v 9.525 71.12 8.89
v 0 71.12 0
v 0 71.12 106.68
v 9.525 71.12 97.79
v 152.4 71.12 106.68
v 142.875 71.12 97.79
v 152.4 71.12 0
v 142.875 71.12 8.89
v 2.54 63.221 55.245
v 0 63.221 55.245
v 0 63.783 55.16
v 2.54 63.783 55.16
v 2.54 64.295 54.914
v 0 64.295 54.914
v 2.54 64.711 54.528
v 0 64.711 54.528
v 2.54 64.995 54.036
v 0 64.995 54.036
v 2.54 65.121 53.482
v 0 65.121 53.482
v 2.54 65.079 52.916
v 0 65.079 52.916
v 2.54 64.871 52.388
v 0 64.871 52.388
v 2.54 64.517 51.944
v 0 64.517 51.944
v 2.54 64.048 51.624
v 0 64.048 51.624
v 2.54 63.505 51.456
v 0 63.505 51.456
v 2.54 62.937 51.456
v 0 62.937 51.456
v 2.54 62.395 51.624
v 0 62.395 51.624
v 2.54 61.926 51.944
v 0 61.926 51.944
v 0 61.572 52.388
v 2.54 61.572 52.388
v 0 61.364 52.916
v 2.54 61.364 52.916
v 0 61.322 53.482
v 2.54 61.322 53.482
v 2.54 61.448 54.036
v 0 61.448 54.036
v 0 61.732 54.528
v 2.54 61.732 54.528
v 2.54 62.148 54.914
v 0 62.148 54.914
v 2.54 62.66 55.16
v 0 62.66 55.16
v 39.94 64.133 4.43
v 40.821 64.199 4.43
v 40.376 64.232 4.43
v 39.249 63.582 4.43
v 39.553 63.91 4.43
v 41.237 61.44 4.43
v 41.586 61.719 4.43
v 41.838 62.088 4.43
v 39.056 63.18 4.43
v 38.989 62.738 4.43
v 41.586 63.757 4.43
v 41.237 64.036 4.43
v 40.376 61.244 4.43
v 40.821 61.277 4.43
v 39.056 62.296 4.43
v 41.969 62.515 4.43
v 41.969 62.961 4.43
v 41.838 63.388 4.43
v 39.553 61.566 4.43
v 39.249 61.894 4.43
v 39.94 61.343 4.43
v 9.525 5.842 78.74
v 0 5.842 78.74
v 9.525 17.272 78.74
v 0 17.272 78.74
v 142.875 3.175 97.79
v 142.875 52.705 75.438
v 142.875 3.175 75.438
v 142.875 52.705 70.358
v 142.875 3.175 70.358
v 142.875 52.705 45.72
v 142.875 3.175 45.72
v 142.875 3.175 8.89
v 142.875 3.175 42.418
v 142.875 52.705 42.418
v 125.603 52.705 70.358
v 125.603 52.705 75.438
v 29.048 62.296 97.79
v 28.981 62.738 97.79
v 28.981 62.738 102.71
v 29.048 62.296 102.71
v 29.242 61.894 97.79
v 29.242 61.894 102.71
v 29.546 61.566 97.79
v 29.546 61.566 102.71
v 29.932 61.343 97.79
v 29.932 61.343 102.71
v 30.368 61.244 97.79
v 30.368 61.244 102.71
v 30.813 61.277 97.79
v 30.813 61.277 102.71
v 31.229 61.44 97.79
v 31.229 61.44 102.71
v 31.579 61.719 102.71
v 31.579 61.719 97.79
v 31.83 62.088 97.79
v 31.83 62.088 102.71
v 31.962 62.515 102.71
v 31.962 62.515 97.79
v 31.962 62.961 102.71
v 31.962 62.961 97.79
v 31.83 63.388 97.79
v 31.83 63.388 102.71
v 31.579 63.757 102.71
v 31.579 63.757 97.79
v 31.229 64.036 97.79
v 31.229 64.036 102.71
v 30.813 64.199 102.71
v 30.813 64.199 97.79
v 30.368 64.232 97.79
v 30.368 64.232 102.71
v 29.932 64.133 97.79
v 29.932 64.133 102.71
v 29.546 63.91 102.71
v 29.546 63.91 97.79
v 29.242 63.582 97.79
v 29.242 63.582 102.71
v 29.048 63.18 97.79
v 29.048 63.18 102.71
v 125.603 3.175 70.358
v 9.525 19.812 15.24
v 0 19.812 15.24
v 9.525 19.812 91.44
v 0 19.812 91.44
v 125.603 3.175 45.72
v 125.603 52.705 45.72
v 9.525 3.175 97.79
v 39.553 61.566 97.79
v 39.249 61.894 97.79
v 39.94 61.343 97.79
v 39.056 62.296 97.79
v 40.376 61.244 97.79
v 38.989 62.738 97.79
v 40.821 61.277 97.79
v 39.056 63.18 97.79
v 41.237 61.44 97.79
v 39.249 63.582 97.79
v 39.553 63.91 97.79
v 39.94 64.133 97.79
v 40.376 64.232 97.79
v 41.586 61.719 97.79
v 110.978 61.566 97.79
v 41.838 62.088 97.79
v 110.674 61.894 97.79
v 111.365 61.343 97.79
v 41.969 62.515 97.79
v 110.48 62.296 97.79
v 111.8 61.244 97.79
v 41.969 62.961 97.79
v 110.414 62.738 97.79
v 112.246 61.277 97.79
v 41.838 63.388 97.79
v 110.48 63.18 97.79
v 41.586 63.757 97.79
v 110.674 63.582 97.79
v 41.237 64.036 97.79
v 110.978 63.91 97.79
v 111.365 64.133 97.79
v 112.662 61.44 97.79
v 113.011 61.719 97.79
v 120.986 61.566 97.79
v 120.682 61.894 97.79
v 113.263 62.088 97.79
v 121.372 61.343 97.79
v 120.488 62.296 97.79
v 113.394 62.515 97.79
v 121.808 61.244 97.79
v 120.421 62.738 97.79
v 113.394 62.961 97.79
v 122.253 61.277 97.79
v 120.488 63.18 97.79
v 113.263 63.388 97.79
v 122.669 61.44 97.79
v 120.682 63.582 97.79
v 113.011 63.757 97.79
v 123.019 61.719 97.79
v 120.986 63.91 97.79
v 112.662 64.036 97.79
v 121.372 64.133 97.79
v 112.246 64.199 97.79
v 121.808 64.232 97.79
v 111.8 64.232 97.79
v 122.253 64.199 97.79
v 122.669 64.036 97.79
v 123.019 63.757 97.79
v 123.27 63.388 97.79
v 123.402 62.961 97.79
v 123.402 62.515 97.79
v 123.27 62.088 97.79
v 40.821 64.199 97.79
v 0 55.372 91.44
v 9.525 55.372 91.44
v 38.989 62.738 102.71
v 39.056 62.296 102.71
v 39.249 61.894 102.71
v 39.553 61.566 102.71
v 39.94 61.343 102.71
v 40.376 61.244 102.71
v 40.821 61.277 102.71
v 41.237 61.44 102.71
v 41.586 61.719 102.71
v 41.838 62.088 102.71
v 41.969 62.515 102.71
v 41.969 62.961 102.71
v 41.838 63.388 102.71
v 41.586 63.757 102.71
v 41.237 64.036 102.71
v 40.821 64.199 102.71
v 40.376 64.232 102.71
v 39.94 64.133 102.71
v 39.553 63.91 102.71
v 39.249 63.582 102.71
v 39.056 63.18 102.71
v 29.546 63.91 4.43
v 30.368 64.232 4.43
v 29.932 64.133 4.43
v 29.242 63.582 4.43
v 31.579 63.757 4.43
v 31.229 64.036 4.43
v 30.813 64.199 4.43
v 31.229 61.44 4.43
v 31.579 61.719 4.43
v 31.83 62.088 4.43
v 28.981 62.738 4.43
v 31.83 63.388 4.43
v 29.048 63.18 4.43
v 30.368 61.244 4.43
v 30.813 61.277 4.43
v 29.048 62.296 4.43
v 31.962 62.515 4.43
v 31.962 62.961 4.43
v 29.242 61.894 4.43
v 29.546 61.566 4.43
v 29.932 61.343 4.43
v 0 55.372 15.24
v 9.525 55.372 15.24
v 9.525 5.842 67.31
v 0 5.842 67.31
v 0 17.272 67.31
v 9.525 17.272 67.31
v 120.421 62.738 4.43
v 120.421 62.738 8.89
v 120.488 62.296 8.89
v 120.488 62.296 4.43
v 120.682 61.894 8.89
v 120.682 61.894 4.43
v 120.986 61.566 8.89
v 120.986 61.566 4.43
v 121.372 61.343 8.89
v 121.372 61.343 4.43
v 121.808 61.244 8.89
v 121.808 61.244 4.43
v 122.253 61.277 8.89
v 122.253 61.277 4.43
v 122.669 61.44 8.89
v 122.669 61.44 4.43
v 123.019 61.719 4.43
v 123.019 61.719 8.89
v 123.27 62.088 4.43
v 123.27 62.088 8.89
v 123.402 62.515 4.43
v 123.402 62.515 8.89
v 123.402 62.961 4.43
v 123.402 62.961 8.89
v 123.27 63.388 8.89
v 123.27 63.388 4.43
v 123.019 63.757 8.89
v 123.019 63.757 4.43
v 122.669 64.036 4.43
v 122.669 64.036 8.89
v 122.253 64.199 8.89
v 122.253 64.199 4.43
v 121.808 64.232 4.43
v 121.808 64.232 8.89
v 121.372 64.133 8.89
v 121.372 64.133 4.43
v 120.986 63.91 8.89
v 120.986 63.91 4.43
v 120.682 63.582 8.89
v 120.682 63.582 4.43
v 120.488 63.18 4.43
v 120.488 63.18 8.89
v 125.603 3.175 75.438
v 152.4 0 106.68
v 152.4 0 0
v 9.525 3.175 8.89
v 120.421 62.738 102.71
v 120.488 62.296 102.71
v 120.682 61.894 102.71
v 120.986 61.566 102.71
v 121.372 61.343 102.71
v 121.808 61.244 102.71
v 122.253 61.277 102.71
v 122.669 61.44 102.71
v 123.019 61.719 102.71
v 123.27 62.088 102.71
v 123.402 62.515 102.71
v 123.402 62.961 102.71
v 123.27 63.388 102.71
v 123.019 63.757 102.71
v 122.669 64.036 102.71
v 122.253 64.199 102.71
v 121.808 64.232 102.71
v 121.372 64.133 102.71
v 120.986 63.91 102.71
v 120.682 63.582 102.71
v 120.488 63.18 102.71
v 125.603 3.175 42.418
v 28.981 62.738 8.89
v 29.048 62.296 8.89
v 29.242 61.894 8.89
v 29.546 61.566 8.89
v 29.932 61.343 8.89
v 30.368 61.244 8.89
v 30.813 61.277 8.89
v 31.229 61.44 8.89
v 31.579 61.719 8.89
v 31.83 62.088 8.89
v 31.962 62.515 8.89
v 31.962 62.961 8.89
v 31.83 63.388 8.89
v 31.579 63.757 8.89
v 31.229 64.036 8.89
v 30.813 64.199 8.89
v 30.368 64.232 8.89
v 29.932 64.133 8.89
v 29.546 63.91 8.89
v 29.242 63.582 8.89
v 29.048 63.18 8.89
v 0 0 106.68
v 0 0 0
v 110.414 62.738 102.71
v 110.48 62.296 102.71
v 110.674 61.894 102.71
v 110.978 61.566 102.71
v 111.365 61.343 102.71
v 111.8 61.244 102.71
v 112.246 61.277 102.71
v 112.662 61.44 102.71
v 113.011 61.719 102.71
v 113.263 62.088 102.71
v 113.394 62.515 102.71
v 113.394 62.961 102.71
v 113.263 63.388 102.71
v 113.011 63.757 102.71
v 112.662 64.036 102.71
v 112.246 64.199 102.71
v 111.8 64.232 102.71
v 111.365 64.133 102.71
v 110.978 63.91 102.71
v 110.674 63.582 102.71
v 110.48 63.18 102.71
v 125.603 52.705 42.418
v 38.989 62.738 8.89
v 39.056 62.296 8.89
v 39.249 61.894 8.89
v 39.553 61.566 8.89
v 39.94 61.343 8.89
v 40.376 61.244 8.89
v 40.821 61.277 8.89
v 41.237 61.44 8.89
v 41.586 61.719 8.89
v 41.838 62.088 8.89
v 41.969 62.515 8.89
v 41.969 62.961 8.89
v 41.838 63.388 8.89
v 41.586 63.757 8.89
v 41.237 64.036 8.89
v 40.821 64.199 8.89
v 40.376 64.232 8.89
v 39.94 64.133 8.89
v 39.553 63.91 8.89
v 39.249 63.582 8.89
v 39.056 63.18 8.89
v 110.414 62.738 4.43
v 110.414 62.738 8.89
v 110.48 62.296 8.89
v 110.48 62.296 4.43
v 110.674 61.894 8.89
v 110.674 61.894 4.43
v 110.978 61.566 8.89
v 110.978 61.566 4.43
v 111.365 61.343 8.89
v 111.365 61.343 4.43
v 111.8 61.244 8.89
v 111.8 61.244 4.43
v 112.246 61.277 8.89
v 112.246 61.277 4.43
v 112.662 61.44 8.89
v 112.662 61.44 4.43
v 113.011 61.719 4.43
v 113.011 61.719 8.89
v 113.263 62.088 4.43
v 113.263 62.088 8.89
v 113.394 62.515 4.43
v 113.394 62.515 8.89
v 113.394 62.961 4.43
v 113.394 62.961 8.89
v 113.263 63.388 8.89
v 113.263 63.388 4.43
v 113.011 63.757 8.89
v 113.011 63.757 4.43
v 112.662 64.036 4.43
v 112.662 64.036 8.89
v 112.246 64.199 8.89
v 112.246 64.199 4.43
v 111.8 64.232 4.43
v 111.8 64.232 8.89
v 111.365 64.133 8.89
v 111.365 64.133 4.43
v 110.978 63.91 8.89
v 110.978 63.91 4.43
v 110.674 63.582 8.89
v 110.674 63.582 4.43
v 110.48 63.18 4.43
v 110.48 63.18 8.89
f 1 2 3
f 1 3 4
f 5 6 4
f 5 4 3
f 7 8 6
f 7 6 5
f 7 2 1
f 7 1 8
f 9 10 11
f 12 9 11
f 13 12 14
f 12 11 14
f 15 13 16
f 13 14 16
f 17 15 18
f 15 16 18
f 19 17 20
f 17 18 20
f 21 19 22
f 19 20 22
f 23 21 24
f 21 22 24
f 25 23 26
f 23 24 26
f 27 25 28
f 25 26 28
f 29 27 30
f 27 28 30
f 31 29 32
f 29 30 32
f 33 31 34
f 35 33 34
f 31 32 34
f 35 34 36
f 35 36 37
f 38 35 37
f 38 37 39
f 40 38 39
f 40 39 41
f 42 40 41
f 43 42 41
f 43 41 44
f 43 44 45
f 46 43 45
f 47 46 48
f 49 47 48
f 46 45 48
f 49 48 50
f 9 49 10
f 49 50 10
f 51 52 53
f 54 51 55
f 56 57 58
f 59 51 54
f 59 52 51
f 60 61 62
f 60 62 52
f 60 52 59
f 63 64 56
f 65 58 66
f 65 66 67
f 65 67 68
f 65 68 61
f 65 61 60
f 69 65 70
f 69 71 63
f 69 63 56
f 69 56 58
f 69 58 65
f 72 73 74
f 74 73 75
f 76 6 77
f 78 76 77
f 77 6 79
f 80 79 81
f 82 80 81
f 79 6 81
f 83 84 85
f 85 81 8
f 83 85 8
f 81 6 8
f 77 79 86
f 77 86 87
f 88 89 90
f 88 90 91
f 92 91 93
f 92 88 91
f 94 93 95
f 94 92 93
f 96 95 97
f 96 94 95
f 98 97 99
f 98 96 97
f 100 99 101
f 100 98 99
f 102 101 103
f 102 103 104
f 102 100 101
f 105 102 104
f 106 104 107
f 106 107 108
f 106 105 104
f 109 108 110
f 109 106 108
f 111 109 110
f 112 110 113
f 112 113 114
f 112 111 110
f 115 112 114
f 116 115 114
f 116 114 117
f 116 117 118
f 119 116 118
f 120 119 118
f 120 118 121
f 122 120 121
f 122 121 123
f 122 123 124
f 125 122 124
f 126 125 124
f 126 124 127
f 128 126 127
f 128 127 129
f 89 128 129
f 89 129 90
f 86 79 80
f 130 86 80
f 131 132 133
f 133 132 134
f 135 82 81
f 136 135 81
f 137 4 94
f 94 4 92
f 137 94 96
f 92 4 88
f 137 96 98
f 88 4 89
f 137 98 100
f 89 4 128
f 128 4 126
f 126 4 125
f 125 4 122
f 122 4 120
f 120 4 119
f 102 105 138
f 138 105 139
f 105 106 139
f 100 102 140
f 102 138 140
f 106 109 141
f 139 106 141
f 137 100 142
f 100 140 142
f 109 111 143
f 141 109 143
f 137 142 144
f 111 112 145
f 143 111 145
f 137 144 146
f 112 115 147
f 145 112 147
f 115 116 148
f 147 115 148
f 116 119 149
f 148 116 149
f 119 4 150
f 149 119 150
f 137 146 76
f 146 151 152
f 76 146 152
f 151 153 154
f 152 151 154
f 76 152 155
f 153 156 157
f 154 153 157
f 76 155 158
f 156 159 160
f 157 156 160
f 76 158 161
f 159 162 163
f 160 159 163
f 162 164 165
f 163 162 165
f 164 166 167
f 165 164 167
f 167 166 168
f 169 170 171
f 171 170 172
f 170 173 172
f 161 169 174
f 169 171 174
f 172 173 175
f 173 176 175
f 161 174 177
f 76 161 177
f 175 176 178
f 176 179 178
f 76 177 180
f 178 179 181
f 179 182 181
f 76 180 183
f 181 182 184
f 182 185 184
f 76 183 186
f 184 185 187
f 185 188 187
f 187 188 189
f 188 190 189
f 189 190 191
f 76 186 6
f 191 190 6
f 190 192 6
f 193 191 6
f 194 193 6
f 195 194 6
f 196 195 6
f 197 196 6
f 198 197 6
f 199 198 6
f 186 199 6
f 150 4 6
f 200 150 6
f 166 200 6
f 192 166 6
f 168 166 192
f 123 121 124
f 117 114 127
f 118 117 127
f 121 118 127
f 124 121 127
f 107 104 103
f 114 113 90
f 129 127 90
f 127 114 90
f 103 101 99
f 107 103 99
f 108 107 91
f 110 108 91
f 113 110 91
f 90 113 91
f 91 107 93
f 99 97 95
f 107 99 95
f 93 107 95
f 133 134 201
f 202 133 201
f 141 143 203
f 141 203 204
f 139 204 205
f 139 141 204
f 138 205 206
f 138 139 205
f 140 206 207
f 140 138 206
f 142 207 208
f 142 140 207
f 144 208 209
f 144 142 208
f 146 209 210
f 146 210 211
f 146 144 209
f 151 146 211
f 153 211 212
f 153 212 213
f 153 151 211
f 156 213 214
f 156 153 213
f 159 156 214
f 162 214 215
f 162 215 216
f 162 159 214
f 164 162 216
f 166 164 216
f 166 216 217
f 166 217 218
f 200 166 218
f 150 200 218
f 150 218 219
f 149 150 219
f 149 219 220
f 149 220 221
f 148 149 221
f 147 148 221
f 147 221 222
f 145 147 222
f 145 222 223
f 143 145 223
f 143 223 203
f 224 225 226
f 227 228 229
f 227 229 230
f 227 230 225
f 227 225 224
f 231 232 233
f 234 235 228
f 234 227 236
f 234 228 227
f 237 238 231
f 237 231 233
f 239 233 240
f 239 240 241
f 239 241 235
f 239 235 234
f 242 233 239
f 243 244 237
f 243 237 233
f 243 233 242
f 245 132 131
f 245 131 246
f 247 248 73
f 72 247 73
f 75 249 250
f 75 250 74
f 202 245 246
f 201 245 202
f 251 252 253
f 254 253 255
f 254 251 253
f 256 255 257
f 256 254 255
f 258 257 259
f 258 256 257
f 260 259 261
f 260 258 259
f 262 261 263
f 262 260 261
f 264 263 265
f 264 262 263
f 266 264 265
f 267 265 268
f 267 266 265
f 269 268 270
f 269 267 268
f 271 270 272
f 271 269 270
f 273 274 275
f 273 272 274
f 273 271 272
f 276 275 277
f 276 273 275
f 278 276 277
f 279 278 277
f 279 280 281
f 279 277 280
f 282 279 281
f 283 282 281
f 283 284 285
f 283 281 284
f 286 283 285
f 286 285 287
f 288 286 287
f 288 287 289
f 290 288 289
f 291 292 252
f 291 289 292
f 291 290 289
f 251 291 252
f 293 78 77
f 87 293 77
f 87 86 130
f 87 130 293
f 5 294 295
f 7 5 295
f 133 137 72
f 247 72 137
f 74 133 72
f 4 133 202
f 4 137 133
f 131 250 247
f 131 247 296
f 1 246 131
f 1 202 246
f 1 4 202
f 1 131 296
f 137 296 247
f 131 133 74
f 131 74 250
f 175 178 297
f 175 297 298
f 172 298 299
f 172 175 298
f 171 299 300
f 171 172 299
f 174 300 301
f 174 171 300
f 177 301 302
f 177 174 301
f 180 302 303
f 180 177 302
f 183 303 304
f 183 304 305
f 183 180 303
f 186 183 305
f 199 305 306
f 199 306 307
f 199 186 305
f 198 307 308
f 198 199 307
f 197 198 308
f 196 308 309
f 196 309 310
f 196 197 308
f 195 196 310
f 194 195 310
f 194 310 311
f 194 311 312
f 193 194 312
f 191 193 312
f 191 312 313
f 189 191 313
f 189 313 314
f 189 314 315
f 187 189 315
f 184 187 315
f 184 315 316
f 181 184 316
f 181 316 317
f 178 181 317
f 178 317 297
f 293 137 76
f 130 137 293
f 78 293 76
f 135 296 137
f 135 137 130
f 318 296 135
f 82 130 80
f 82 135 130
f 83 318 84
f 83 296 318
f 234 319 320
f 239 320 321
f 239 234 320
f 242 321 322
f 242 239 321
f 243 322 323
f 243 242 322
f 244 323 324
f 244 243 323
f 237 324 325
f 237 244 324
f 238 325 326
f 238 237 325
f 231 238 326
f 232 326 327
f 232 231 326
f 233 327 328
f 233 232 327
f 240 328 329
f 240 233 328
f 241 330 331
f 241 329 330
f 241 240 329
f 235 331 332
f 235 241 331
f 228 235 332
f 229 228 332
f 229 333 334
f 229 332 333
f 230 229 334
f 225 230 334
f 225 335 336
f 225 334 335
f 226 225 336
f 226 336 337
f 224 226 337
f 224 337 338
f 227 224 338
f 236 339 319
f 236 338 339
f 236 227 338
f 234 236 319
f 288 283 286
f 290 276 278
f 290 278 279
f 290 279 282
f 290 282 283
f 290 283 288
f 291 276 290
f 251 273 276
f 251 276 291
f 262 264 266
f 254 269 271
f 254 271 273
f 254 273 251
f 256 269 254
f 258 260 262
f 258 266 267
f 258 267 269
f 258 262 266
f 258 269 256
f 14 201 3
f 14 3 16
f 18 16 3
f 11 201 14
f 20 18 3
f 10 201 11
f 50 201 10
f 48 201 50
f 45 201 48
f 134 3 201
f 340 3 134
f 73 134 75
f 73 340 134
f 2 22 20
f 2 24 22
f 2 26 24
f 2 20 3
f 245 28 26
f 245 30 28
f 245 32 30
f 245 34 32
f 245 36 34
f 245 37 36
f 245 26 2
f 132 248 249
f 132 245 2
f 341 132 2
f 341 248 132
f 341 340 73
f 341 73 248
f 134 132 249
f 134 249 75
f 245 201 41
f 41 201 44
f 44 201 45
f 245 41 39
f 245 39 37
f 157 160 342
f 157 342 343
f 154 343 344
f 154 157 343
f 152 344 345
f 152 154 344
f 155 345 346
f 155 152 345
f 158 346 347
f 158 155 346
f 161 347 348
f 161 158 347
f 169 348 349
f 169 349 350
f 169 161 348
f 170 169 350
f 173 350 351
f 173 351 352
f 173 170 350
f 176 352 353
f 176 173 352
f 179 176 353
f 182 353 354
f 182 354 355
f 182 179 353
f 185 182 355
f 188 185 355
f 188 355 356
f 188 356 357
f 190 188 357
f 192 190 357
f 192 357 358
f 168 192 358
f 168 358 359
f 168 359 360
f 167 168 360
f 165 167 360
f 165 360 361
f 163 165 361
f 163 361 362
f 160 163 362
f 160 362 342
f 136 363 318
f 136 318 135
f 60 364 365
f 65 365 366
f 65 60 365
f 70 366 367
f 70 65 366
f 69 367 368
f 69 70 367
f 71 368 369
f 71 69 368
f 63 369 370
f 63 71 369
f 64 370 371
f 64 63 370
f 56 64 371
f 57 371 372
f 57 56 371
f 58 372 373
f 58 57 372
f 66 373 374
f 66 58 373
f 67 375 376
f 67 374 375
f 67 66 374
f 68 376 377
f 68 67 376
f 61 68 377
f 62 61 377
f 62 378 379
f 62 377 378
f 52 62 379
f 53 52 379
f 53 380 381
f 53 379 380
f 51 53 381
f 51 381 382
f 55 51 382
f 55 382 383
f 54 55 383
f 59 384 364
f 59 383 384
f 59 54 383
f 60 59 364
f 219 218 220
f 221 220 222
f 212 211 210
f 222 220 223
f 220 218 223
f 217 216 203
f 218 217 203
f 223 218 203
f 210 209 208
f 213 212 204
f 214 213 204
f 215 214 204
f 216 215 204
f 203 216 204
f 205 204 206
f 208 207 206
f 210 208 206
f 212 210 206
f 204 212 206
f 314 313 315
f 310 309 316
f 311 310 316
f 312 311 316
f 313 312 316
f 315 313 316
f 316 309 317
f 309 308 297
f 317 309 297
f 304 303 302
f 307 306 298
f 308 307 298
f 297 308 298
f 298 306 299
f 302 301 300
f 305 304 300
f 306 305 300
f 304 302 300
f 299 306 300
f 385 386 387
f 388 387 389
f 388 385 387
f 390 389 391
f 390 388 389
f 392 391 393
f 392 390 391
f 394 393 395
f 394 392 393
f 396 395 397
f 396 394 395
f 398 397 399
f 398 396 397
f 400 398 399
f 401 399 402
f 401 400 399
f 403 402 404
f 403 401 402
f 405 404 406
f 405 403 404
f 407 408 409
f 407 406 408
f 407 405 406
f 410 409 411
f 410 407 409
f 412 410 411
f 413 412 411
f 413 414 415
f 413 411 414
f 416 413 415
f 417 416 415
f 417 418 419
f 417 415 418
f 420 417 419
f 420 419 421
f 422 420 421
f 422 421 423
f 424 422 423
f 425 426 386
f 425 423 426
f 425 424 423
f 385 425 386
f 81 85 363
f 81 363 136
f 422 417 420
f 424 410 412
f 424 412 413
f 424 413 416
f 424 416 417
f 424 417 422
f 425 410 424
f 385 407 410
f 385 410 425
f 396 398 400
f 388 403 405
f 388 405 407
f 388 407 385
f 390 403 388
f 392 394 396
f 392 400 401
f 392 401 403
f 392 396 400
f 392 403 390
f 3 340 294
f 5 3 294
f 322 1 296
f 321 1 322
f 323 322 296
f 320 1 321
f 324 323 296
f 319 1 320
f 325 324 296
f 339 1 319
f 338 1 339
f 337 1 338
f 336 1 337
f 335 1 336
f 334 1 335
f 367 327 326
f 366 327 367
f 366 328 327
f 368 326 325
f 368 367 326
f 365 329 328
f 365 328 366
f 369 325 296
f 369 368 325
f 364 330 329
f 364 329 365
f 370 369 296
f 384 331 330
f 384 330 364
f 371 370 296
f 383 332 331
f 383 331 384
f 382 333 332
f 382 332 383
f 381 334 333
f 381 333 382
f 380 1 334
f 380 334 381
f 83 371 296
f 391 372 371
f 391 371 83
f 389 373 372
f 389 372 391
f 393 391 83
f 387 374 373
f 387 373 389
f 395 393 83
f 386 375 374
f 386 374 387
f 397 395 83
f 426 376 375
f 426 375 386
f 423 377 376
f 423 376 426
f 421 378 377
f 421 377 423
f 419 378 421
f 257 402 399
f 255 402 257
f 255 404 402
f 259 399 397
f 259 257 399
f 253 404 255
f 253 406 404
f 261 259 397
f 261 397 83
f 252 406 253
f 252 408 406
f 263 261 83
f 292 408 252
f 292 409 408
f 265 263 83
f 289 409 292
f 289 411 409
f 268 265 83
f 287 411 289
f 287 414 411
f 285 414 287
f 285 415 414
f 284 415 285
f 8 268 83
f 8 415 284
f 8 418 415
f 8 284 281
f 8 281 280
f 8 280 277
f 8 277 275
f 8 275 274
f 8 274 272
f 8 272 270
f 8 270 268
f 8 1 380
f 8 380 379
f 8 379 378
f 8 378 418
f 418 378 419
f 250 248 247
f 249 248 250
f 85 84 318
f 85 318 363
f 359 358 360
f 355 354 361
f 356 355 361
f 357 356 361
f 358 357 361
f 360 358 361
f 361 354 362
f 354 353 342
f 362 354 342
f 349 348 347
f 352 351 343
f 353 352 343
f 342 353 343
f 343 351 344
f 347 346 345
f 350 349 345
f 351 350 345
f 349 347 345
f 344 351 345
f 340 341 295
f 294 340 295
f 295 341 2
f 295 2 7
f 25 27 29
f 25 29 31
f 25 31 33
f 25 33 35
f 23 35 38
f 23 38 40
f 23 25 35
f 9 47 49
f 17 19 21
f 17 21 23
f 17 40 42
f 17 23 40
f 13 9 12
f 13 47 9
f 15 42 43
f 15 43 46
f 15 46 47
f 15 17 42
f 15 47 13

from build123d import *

# Parameters (mm, degrees)
SKETCH2_W                = 152.4
SKETCH2_H                = 106.68
BOSS_EXTRUDE1_DEPTH      = 71.12
SKETCH3_W                = 133.35
SKETCH3_H                = 88.9
CUT_EXTRUDE1_DEPTH       = 67.945
SKETCH8_W                = 5.08
SKETCH8_H                = 24.765
SKETCH8_W_2              = 3.302
SKETCH8_H_2              = 49.53
BOSS_EXTRUDE2_DEPTH      = 17.272
SKETCH12_W               = 76.2
SKETCH12_H               = 35.56
CUT_EXTRUDE3_DEPTH       = 9.525
CUT_EXTRUDE12_DEPTH      = 93.820000066
CUT_EXTRUDE12_DEPTH_BACK = 4.45999997
SKETCH35_R               = 1.4986
SKETCH36_R               = 1.905
CUT_EXTRUDE13_DEPTH      = 2.54
SKETCH37_W               = 11.43
SKETCH37_H               = 11.43
CUT_EXTRUDE14_DEPTH      = 9.525


with BuildPart() as part:
    # Sketch2 → Boss-Extrude1 (new body)
    with BuildSketch(Plane(origin=(0, 0, 0), x_dir=(1, 0, 0), z_dir=(0, 1, 0))):
        with Locations((76.2, -53.34)):
            Rectangle(SKETCH2_W, SKETCH2_H)
    extrude(amount=BOSS_EXTRUDE1_DEPTH)

    # Sketch3 → Cut-Extrude1 (cut)
    with BuildSketch(Plane(origin=(0, 71.12, 0), x_dir=(1, 0, 0), z_dir=(0, 1, 0))):
        with Locations((76.2, -53.34)):
            Rectangle(SKETCH3_W, SKETCH3_H)
    extrude(amount=-CUT_EXTRUDE1_DEPTH, mode=Mode.SUBTRACT)

    # Sketch8 → Boss-Extrude2 (add)
    with BuildSketch(Plane.ZY.offset(-142.875)):
        with Locations((72.898, 40.3225)):
            Rectangle(SKETCH8_W, SKETCH8_H)
        with Locations((72.898, 15.5575)):
            Rectangle(SKETCH8_W, SKETCH8_H)
        with Locations((44.069, 27.94)):
            Rectangle(SKETCH8_W_2, SKETCH8_H_2)
    extrude(amount=BOSS_EXTRUDE2_DEPTH)

    # Sketch12 → Cut-Extrude3 (cut)
    with BuildSketch(Plane.ZY):
        with Locations((53.34, 37.592)):
            Rectangle(SKETCH12_W, SKETCH12_H)
    extrude(amount=-CUT_EXTRUDE3_DEPTH, mode=Mode.SUBTRACT)

    # Sketch35 → Cut-Extrude12 (cut, two sides: drawn at the far end of the back side and taken through both)
    with BuildSketch(Plane.XY.offset(8.89).offset(-CUT_EXTRUDE12_DEPTH_BACK)):
        with Locations(Location((30.48, 62.738, 0), (0, 0, 180))):
            Circle(SKETCH35_R)
        with Locations(Location((40.4876, 62.738, 0), (0, 0, 180))):
            Circle(SKETCH35_R)
        with Locations(Location((111.9124, 62.738, 0), (0, 0, 180))):
            Circle(SKETCH35_R)
        with Locations(Location((121.92, 62.738, 0), (0, 0, 180))):
            Circle(SKETCH35_R)
    extrude(amount=CUT_EXTRUDE12_DEPTH + CUT_EXTRUDE12_DEPTH_BACK, mode=Mode.SUBTRACT)

    # Sketch36 → Cut-Extrude13 (cut)
    with BuildSketch(Plane.ZY):
        with Locations((53.34, 63.221423834)):
            Circle(SKETCH36_R)
    extrude(amount=-CUT_EXTRUDE13_DEPTH, mode=Mode.SUBTRACT)

    # Sketch37 → Cut-Extrude14 (cut)
    with BuildSketch(Plane.ZY):
        with Locations((73.025, 11.557)):
            Rectangle(SKETCH37_W, SKETCH37_H)
    extrude(amount=-CUT_EXTRUDE14_DEPTH, mode=Mode.SUBTRACT)


solid = part.part
